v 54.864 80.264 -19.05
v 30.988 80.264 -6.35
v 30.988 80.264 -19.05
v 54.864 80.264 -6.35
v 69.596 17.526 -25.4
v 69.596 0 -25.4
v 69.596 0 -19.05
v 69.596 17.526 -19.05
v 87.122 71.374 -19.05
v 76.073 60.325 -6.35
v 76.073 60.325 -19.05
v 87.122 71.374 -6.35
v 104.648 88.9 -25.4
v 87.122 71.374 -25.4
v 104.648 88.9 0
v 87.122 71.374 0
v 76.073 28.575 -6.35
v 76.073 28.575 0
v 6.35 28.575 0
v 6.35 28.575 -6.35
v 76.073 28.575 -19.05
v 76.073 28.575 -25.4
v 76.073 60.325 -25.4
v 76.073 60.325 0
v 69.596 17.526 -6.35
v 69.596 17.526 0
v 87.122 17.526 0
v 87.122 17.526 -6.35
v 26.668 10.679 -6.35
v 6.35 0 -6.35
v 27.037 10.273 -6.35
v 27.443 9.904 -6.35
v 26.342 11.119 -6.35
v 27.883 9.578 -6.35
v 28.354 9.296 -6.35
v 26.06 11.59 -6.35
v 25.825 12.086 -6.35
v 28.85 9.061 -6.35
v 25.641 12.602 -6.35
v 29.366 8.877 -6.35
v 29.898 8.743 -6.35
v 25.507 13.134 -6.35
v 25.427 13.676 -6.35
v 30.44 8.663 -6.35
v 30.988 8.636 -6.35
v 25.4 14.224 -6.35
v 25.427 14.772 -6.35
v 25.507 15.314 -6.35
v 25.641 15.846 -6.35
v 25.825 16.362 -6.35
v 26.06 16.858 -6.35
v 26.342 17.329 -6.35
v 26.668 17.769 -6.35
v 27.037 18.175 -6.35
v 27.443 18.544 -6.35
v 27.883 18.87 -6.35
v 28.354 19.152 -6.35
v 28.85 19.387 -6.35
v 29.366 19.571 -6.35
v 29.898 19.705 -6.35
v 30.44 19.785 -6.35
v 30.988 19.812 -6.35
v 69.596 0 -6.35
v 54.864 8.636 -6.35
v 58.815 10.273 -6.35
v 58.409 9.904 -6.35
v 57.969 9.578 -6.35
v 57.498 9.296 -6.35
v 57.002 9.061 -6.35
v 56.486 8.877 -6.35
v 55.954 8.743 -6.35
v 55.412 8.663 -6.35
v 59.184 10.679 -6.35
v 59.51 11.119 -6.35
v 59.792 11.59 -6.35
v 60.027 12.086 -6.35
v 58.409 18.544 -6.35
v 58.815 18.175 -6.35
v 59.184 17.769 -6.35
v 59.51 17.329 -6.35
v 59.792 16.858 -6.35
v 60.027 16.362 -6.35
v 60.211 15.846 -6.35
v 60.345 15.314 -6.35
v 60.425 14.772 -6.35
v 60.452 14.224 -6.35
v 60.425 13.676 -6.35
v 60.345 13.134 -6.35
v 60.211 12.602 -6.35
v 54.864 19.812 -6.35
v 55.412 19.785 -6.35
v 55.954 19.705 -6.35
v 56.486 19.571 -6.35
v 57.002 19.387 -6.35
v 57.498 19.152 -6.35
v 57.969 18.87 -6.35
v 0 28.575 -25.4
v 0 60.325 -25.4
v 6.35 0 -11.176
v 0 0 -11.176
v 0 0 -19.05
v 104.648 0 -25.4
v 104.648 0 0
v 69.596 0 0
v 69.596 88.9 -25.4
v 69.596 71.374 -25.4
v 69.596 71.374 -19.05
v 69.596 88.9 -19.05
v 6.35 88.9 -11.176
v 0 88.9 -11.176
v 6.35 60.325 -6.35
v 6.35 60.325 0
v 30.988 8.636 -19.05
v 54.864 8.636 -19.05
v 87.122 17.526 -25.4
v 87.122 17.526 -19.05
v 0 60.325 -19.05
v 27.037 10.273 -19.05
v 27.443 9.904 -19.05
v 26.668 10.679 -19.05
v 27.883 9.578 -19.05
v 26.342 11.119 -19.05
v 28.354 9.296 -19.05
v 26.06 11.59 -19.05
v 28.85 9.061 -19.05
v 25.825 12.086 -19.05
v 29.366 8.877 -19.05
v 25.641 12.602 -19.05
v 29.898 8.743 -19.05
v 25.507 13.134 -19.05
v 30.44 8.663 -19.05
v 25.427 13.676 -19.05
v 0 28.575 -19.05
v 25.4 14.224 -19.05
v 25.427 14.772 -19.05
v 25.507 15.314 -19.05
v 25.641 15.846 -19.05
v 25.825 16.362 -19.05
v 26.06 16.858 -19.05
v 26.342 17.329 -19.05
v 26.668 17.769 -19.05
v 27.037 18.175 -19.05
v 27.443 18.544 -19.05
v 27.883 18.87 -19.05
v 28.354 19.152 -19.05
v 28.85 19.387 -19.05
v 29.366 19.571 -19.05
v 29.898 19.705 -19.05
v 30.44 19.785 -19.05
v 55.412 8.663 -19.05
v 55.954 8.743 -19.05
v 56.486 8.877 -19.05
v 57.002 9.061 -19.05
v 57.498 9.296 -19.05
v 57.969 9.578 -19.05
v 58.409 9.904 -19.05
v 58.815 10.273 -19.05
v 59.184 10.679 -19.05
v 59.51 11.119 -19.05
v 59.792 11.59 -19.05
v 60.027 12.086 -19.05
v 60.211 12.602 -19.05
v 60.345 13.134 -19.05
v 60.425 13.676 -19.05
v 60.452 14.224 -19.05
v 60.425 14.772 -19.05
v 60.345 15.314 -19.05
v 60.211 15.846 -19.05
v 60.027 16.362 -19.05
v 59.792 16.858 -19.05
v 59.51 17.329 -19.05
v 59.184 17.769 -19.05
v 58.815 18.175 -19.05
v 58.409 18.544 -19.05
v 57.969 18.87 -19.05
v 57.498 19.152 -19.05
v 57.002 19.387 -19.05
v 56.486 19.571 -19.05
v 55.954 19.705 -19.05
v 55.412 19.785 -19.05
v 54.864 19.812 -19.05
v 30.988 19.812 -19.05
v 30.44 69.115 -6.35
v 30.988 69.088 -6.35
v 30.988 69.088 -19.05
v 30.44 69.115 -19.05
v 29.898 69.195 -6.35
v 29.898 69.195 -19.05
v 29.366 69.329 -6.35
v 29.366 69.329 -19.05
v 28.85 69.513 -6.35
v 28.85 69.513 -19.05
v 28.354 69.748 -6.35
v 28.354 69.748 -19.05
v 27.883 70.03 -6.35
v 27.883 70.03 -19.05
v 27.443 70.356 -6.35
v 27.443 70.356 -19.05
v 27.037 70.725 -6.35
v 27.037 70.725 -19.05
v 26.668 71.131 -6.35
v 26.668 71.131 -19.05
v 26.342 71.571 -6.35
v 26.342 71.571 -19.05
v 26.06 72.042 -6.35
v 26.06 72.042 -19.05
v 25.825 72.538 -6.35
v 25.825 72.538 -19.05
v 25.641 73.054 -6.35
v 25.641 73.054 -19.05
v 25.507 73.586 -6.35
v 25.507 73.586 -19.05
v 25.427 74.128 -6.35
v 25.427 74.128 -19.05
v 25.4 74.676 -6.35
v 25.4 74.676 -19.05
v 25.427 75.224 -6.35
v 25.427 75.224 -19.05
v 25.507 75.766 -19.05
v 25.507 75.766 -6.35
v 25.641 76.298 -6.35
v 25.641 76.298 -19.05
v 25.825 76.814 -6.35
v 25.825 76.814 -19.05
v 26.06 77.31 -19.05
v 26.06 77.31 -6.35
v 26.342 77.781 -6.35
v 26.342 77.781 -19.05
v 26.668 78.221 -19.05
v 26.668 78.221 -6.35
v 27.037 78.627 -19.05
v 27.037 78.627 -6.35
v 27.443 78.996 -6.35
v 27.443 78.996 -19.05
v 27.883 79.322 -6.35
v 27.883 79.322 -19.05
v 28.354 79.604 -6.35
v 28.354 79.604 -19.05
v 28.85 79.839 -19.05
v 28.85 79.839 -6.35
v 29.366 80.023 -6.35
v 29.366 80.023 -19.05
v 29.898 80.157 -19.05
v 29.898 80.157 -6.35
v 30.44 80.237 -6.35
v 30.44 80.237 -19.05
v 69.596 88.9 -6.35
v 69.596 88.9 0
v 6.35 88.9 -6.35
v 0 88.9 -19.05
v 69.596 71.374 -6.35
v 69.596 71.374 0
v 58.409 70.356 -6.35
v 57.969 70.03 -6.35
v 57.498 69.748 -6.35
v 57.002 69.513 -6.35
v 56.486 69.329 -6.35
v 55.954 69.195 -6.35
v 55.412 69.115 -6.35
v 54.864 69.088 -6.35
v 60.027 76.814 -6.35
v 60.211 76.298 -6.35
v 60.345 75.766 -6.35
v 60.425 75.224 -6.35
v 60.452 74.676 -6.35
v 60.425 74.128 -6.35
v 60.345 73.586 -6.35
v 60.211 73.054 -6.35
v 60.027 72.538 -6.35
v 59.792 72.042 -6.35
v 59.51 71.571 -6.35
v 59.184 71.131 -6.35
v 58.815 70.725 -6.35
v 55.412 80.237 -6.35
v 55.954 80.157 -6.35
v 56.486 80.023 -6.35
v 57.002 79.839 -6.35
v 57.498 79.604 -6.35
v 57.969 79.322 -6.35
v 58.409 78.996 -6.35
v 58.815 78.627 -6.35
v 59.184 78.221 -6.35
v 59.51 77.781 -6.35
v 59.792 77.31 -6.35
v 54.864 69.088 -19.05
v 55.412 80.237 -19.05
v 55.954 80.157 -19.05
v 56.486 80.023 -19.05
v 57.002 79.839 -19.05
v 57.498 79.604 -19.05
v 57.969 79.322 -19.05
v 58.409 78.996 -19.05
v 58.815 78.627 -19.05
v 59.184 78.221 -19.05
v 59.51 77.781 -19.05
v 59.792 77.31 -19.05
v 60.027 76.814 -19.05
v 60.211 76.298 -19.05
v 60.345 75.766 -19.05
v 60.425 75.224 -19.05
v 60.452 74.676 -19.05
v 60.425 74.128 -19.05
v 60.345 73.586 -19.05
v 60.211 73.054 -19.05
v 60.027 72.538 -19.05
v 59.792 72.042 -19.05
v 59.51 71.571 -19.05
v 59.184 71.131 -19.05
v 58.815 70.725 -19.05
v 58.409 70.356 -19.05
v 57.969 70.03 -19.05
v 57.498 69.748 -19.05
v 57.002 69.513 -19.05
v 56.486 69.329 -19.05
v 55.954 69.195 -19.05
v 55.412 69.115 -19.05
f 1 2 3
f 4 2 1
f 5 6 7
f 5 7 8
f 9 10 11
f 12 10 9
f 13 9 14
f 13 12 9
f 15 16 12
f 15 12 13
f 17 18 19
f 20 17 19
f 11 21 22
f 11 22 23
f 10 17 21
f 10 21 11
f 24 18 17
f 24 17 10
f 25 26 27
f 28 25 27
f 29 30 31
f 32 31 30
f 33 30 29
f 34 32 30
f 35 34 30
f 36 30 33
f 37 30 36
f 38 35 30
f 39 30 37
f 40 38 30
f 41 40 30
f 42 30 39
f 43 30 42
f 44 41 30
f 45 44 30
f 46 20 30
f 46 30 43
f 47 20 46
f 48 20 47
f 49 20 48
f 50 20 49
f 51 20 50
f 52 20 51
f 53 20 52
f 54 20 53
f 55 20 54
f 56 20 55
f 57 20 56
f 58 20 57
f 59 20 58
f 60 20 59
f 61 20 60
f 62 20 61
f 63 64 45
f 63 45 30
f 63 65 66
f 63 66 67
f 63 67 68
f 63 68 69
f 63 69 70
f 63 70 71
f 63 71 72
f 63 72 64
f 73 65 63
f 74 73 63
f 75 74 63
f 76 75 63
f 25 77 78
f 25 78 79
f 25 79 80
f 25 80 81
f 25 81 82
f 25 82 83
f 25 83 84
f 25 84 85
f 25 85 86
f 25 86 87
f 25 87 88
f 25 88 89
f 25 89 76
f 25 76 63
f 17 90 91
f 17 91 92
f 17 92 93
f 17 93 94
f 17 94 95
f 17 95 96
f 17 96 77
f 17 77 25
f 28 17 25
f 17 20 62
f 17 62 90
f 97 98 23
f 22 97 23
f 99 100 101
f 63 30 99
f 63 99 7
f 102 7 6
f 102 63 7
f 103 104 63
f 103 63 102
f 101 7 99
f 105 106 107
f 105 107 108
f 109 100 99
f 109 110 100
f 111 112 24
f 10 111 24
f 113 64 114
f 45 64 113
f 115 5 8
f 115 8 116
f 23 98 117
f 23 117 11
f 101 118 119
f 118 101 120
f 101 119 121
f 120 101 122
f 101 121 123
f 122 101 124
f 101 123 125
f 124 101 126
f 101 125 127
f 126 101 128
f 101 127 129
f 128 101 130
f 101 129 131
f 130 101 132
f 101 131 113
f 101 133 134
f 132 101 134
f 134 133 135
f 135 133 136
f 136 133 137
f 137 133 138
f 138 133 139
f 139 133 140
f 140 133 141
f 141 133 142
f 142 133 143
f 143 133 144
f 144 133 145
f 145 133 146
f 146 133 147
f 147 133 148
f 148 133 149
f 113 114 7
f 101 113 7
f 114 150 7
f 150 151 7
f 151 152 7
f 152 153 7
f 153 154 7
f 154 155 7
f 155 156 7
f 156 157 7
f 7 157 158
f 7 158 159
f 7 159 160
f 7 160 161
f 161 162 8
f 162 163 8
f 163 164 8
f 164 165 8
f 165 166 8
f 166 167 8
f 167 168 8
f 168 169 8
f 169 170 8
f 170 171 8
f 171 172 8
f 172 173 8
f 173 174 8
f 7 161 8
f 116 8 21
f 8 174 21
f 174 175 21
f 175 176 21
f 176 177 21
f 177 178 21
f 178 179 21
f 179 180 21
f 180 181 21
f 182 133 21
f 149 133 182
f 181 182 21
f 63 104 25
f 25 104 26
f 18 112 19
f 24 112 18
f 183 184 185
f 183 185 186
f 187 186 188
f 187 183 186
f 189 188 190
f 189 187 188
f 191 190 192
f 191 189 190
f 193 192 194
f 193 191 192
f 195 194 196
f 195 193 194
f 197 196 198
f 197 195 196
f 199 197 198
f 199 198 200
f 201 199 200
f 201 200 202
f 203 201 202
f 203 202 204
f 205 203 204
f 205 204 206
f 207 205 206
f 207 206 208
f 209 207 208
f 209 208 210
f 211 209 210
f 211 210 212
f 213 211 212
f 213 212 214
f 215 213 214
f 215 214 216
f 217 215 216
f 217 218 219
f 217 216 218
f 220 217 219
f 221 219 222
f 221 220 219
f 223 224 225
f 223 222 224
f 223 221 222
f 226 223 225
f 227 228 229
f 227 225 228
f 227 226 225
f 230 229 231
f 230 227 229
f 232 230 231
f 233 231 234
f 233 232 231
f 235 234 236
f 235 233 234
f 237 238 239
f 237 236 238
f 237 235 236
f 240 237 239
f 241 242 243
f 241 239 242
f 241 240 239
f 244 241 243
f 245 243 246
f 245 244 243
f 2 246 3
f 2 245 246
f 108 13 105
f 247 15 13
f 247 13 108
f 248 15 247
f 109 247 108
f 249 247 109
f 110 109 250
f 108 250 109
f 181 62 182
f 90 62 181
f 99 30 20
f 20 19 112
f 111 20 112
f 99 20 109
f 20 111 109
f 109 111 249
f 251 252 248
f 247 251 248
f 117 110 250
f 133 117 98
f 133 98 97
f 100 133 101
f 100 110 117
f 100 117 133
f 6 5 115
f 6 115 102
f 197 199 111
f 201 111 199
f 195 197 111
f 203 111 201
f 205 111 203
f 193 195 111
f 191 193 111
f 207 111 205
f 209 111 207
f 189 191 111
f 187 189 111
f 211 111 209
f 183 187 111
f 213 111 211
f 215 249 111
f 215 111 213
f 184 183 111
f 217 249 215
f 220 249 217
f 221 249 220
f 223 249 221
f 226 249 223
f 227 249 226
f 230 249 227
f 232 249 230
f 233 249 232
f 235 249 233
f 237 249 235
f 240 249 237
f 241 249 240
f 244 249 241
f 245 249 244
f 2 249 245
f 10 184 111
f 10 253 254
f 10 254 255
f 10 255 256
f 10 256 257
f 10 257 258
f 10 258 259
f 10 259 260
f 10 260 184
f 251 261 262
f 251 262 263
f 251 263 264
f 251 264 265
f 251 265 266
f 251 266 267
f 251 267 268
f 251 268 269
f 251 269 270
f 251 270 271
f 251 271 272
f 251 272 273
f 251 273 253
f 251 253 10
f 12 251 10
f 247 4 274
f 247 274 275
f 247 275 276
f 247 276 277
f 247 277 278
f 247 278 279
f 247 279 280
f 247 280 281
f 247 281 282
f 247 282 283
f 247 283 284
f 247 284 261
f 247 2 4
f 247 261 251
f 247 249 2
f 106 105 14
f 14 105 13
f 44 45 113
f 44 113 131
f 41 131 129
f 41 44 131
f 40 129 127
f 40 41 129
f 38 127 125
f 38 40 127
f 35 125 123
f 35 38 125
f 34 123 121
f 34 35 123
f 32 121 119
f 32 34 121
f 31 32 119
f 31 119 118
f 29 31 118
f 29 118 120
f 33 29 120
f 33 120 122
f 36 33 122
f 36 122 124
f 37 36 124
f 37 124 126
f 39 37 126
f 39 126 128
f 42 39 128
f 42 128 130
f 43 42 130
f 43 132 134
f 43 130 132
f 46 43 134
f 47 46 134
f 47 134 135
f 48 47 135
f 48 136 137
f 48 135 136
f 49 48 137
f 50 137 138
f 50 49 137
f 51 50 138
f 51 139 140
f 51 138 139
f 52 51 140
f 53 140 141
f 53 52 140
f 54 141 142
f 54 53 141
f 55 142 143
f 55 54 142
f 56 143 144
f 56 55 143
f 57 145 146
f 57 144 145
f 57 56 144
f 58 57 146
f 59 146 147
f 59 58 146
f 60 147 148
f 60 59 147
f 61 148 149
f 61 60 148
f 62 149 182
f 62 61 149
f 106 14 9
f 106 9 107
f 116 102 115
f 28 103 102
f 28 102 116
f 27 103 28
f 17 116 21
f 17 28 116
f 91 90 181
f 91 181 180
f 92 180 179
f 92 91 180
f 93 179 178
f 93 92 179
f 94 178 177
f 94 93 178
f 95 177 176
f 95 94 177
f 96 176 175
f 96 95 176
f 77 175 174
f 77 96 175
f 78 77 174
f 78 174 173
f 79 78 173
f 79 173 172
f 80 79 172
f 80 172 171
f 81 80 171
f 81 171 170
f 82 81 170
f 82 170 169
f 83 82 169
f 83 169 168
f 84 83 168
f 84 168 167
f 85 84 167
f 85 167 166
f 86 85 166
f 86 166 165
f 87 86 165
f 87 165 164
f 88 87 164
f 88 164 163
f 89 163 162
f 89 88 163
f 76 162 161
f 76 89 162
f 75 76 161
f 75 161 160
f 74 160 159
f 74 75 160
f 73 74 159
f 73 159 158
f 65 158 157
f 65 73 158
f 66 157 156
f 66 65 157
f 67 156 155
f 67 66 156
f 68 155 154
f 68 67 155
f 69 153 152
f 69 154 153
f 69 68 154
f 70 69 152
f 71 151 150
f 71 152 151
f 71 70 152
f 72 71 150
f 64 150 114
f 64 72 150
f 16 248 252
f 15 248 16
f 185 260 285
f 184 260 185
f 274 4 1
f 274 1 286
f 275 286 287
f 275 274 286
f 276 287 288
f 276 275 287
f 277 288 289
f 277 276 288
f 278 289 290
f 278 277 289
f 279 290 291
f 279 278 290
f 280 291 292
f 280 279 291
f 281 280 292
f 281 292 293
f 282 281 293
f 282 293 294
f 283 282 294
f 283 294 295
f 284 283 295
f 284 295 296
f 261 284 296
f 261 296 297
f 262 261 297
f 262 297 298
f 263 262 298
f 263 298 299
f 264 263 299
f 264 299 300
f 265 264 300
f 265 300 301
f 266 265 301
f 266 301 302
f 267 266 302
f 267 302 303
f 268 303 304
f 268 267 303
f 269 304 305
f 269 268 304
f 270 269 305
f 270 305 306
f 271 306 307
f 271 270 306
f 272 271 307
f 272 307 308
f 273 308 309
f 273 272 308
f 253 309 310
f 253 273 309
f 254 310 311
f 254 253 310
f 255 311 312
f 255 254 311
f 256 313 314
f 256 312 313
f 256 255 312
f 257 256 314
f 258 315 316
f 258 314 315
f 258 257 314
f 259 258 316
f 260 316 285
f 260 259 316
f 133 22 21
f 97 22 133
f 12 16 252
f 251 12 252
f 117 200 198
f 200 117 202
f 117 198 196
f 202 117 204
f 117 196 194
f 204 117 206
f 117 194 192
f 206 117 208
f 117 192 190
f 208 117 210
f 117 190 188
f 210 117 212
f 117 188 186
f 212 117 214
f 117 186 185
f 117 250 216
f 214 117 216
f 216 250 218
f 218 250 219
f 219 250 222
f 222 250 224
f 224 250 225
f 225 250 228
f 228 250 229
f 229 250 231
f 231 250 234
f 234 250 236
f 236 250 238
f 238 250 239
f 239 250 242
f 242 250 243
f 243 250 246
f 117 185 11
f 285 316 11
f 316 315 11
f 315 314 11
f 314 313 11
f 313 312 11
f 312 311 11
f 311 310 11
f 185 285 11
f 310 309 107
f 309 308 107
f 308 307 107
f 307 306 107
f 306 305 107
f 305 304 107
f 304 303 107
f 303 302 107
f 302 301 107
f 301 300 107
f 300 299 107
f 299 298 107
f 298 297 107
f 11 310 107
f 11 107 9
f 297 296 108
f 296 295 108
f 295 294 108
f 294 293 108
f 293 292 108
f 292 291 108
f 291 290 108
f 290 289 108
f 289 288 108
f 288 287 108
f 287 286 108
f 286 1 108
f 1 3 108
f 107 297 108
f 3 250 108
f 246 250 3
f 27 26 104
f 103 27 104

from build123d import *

# Parameters (mm, degrees)
F0_W     = 6.35
F0_H     = 28.575
F0_H_2   = 31.75
F0_W_2   = 69.723
F1_DEPTH = 25.4
F2_DEPTH = 6.35
F3_DEPTH = 6.35
F4_DEPTH = 11.176
F7_DEPTH = 6.35


with BuildPart() as f1:
    # F0 (on Top) → F1 (new body)
    with BuildSketch(Plane.XY):
        with Locations((3.175, 14.2875)):
            Rectangle(F0_W, F0_H)
        Polygon((6.35, 28.575), (6.35, 0), (69.596, 0), (69.596, 17.526), (87.122, 17.526), (76.073, 28.575), align=None)
        with BuildLine():
            ThreePointArc((30.988, 8.636), (25.4, 14.224), (30.988, 19.812))
            Line((30.988, 19.812), (54.864, 19.812))
            ThreePointArc((54.864, 19.812), (60.452, 14.224), (54.864, 8.636))
            Line((54.864, 8.636), (30.988, 8.636))
        make_face(mode=Mode.SUBTRACT)
        with Locations((3.175, 44.45)):
            Rectangle(F0_W, F0_H_2)
        Polygon((69.596, 17.526), (69.596, 0), (104.648, 0), (87.122, 17.526), align=None)
        with Locations((41.2115, 44.45)):
            Rectangle(F0_W_2, F0_H_2)
        with Locations((3.175, 74.6125)):
            Rectangle(F0_W, F0_H)
        Polygon((6.35, 88.9), (6.35, 60.325), (76.073, 60.325), (87.122, 71.374), (69.596, 71.374), (69.596, 88.9), align=None)
        with BuildLine():
            Line((54.864, 69.088), (30.988, 69.088))
            ThreePointArc((30.988, 69.088), (25.4, 74.676), (30.988, 80.264))
            Line((30.988, 80.264), (54.864, 80.264))
            ThreePointArc((54.864, 80.264), (60.452, 74.676), (54.864, 69.088))
        make_face(mode=Mode.SUBTRACT)
        Polygon((69.596, 71.374), (87.122, 71.374), (104.648, 88.9), (69.596, 88.9), align=None)
    extrude(amount=-F1_DEPTH)

    # F0 (on Top) → F2 (cut)
    with BuildSketch(Plane.XY):
        Polygon((6.35, 28.575), (6.35, 0), (69.596, 0), (69.596, 17.526), (87.122, 17.526), (76.073, 28.575), align=None)
        with BuildLine():
            ThreePointArc((30.988, 8.636), (25.4, 14.224), (30.988, 19.812))
            Line((30.988, 19.812), (54.864, 19.812))
            ThreePointArc((54.864, 19.812), (60.452, 14.224), (54.864, 8.636))
            Line((54.864, 8.636), (30.988, 8.636))
        make_face(mode=Mode.SUBTRACT)
    extrude(amount=-F2_DEPTH, mode=Mode.SUBTRACT)

    # F0 (on Top) → F3 (cut)
    with BuildSketch(Plane.XY):
        Polygon((6.35, 88.9), (6.35, 60.325), (76.073, 60.325), (87.122, 71.374), (69.596, 71.374), (69.596, 88.9), align=None)
        with BuildLine():
            Line((54.864, 69.088), (30.988, 69.088))
            ThreePointArc((30.988, 69.088), (25.4, 74.676), (30.988, 80.264))
            Line((30.988, 80.264), (54.864, 80.264))
            ThreePointArc((54.864, 80.264), (60.452, 74.676), (54.864, 69.088))
        make_face(mode=Mode.SUBTRACT)
    extrude(amount=-F3_DEPTH, mode=Mode.SUBTRACT)

    # F0 (on Top) → F4 (cut)
    with BuildSketch(Plane.XY):
        with Locations((3.175, 14.2875)):
            Rectangle(F0_W, F0_H)
        with Locations((3.175, 44.45)):
            Rectangle(F0_W, F0_H_2)
        with Locations((3.175, 74.6125)):
            Rectangle(F0_W, F0_H)
    extrude(amount=-F4_DEPTH, mode=Mode.SUBTRACT)

    # F6 (on offset) → F7 (cut)
    with BuildSketch(Plane.XY.offset(-25.4)):
        Polygon((0, 28.575), (0, 0), (69.596, 0), (69.596, 17.526), (87.122, 17.526), (76.073, 28.575), align=None)
        Polygon((0, 88.9), (0, 60.325), (76.073, 60.325), (87.122, 71.374), (69.596, 71.374), (69.596, 88.9), align=None)
    extrude(amount=F7_DEPTH, mode=Mode.SUBTRACT)


solid = f1.part
